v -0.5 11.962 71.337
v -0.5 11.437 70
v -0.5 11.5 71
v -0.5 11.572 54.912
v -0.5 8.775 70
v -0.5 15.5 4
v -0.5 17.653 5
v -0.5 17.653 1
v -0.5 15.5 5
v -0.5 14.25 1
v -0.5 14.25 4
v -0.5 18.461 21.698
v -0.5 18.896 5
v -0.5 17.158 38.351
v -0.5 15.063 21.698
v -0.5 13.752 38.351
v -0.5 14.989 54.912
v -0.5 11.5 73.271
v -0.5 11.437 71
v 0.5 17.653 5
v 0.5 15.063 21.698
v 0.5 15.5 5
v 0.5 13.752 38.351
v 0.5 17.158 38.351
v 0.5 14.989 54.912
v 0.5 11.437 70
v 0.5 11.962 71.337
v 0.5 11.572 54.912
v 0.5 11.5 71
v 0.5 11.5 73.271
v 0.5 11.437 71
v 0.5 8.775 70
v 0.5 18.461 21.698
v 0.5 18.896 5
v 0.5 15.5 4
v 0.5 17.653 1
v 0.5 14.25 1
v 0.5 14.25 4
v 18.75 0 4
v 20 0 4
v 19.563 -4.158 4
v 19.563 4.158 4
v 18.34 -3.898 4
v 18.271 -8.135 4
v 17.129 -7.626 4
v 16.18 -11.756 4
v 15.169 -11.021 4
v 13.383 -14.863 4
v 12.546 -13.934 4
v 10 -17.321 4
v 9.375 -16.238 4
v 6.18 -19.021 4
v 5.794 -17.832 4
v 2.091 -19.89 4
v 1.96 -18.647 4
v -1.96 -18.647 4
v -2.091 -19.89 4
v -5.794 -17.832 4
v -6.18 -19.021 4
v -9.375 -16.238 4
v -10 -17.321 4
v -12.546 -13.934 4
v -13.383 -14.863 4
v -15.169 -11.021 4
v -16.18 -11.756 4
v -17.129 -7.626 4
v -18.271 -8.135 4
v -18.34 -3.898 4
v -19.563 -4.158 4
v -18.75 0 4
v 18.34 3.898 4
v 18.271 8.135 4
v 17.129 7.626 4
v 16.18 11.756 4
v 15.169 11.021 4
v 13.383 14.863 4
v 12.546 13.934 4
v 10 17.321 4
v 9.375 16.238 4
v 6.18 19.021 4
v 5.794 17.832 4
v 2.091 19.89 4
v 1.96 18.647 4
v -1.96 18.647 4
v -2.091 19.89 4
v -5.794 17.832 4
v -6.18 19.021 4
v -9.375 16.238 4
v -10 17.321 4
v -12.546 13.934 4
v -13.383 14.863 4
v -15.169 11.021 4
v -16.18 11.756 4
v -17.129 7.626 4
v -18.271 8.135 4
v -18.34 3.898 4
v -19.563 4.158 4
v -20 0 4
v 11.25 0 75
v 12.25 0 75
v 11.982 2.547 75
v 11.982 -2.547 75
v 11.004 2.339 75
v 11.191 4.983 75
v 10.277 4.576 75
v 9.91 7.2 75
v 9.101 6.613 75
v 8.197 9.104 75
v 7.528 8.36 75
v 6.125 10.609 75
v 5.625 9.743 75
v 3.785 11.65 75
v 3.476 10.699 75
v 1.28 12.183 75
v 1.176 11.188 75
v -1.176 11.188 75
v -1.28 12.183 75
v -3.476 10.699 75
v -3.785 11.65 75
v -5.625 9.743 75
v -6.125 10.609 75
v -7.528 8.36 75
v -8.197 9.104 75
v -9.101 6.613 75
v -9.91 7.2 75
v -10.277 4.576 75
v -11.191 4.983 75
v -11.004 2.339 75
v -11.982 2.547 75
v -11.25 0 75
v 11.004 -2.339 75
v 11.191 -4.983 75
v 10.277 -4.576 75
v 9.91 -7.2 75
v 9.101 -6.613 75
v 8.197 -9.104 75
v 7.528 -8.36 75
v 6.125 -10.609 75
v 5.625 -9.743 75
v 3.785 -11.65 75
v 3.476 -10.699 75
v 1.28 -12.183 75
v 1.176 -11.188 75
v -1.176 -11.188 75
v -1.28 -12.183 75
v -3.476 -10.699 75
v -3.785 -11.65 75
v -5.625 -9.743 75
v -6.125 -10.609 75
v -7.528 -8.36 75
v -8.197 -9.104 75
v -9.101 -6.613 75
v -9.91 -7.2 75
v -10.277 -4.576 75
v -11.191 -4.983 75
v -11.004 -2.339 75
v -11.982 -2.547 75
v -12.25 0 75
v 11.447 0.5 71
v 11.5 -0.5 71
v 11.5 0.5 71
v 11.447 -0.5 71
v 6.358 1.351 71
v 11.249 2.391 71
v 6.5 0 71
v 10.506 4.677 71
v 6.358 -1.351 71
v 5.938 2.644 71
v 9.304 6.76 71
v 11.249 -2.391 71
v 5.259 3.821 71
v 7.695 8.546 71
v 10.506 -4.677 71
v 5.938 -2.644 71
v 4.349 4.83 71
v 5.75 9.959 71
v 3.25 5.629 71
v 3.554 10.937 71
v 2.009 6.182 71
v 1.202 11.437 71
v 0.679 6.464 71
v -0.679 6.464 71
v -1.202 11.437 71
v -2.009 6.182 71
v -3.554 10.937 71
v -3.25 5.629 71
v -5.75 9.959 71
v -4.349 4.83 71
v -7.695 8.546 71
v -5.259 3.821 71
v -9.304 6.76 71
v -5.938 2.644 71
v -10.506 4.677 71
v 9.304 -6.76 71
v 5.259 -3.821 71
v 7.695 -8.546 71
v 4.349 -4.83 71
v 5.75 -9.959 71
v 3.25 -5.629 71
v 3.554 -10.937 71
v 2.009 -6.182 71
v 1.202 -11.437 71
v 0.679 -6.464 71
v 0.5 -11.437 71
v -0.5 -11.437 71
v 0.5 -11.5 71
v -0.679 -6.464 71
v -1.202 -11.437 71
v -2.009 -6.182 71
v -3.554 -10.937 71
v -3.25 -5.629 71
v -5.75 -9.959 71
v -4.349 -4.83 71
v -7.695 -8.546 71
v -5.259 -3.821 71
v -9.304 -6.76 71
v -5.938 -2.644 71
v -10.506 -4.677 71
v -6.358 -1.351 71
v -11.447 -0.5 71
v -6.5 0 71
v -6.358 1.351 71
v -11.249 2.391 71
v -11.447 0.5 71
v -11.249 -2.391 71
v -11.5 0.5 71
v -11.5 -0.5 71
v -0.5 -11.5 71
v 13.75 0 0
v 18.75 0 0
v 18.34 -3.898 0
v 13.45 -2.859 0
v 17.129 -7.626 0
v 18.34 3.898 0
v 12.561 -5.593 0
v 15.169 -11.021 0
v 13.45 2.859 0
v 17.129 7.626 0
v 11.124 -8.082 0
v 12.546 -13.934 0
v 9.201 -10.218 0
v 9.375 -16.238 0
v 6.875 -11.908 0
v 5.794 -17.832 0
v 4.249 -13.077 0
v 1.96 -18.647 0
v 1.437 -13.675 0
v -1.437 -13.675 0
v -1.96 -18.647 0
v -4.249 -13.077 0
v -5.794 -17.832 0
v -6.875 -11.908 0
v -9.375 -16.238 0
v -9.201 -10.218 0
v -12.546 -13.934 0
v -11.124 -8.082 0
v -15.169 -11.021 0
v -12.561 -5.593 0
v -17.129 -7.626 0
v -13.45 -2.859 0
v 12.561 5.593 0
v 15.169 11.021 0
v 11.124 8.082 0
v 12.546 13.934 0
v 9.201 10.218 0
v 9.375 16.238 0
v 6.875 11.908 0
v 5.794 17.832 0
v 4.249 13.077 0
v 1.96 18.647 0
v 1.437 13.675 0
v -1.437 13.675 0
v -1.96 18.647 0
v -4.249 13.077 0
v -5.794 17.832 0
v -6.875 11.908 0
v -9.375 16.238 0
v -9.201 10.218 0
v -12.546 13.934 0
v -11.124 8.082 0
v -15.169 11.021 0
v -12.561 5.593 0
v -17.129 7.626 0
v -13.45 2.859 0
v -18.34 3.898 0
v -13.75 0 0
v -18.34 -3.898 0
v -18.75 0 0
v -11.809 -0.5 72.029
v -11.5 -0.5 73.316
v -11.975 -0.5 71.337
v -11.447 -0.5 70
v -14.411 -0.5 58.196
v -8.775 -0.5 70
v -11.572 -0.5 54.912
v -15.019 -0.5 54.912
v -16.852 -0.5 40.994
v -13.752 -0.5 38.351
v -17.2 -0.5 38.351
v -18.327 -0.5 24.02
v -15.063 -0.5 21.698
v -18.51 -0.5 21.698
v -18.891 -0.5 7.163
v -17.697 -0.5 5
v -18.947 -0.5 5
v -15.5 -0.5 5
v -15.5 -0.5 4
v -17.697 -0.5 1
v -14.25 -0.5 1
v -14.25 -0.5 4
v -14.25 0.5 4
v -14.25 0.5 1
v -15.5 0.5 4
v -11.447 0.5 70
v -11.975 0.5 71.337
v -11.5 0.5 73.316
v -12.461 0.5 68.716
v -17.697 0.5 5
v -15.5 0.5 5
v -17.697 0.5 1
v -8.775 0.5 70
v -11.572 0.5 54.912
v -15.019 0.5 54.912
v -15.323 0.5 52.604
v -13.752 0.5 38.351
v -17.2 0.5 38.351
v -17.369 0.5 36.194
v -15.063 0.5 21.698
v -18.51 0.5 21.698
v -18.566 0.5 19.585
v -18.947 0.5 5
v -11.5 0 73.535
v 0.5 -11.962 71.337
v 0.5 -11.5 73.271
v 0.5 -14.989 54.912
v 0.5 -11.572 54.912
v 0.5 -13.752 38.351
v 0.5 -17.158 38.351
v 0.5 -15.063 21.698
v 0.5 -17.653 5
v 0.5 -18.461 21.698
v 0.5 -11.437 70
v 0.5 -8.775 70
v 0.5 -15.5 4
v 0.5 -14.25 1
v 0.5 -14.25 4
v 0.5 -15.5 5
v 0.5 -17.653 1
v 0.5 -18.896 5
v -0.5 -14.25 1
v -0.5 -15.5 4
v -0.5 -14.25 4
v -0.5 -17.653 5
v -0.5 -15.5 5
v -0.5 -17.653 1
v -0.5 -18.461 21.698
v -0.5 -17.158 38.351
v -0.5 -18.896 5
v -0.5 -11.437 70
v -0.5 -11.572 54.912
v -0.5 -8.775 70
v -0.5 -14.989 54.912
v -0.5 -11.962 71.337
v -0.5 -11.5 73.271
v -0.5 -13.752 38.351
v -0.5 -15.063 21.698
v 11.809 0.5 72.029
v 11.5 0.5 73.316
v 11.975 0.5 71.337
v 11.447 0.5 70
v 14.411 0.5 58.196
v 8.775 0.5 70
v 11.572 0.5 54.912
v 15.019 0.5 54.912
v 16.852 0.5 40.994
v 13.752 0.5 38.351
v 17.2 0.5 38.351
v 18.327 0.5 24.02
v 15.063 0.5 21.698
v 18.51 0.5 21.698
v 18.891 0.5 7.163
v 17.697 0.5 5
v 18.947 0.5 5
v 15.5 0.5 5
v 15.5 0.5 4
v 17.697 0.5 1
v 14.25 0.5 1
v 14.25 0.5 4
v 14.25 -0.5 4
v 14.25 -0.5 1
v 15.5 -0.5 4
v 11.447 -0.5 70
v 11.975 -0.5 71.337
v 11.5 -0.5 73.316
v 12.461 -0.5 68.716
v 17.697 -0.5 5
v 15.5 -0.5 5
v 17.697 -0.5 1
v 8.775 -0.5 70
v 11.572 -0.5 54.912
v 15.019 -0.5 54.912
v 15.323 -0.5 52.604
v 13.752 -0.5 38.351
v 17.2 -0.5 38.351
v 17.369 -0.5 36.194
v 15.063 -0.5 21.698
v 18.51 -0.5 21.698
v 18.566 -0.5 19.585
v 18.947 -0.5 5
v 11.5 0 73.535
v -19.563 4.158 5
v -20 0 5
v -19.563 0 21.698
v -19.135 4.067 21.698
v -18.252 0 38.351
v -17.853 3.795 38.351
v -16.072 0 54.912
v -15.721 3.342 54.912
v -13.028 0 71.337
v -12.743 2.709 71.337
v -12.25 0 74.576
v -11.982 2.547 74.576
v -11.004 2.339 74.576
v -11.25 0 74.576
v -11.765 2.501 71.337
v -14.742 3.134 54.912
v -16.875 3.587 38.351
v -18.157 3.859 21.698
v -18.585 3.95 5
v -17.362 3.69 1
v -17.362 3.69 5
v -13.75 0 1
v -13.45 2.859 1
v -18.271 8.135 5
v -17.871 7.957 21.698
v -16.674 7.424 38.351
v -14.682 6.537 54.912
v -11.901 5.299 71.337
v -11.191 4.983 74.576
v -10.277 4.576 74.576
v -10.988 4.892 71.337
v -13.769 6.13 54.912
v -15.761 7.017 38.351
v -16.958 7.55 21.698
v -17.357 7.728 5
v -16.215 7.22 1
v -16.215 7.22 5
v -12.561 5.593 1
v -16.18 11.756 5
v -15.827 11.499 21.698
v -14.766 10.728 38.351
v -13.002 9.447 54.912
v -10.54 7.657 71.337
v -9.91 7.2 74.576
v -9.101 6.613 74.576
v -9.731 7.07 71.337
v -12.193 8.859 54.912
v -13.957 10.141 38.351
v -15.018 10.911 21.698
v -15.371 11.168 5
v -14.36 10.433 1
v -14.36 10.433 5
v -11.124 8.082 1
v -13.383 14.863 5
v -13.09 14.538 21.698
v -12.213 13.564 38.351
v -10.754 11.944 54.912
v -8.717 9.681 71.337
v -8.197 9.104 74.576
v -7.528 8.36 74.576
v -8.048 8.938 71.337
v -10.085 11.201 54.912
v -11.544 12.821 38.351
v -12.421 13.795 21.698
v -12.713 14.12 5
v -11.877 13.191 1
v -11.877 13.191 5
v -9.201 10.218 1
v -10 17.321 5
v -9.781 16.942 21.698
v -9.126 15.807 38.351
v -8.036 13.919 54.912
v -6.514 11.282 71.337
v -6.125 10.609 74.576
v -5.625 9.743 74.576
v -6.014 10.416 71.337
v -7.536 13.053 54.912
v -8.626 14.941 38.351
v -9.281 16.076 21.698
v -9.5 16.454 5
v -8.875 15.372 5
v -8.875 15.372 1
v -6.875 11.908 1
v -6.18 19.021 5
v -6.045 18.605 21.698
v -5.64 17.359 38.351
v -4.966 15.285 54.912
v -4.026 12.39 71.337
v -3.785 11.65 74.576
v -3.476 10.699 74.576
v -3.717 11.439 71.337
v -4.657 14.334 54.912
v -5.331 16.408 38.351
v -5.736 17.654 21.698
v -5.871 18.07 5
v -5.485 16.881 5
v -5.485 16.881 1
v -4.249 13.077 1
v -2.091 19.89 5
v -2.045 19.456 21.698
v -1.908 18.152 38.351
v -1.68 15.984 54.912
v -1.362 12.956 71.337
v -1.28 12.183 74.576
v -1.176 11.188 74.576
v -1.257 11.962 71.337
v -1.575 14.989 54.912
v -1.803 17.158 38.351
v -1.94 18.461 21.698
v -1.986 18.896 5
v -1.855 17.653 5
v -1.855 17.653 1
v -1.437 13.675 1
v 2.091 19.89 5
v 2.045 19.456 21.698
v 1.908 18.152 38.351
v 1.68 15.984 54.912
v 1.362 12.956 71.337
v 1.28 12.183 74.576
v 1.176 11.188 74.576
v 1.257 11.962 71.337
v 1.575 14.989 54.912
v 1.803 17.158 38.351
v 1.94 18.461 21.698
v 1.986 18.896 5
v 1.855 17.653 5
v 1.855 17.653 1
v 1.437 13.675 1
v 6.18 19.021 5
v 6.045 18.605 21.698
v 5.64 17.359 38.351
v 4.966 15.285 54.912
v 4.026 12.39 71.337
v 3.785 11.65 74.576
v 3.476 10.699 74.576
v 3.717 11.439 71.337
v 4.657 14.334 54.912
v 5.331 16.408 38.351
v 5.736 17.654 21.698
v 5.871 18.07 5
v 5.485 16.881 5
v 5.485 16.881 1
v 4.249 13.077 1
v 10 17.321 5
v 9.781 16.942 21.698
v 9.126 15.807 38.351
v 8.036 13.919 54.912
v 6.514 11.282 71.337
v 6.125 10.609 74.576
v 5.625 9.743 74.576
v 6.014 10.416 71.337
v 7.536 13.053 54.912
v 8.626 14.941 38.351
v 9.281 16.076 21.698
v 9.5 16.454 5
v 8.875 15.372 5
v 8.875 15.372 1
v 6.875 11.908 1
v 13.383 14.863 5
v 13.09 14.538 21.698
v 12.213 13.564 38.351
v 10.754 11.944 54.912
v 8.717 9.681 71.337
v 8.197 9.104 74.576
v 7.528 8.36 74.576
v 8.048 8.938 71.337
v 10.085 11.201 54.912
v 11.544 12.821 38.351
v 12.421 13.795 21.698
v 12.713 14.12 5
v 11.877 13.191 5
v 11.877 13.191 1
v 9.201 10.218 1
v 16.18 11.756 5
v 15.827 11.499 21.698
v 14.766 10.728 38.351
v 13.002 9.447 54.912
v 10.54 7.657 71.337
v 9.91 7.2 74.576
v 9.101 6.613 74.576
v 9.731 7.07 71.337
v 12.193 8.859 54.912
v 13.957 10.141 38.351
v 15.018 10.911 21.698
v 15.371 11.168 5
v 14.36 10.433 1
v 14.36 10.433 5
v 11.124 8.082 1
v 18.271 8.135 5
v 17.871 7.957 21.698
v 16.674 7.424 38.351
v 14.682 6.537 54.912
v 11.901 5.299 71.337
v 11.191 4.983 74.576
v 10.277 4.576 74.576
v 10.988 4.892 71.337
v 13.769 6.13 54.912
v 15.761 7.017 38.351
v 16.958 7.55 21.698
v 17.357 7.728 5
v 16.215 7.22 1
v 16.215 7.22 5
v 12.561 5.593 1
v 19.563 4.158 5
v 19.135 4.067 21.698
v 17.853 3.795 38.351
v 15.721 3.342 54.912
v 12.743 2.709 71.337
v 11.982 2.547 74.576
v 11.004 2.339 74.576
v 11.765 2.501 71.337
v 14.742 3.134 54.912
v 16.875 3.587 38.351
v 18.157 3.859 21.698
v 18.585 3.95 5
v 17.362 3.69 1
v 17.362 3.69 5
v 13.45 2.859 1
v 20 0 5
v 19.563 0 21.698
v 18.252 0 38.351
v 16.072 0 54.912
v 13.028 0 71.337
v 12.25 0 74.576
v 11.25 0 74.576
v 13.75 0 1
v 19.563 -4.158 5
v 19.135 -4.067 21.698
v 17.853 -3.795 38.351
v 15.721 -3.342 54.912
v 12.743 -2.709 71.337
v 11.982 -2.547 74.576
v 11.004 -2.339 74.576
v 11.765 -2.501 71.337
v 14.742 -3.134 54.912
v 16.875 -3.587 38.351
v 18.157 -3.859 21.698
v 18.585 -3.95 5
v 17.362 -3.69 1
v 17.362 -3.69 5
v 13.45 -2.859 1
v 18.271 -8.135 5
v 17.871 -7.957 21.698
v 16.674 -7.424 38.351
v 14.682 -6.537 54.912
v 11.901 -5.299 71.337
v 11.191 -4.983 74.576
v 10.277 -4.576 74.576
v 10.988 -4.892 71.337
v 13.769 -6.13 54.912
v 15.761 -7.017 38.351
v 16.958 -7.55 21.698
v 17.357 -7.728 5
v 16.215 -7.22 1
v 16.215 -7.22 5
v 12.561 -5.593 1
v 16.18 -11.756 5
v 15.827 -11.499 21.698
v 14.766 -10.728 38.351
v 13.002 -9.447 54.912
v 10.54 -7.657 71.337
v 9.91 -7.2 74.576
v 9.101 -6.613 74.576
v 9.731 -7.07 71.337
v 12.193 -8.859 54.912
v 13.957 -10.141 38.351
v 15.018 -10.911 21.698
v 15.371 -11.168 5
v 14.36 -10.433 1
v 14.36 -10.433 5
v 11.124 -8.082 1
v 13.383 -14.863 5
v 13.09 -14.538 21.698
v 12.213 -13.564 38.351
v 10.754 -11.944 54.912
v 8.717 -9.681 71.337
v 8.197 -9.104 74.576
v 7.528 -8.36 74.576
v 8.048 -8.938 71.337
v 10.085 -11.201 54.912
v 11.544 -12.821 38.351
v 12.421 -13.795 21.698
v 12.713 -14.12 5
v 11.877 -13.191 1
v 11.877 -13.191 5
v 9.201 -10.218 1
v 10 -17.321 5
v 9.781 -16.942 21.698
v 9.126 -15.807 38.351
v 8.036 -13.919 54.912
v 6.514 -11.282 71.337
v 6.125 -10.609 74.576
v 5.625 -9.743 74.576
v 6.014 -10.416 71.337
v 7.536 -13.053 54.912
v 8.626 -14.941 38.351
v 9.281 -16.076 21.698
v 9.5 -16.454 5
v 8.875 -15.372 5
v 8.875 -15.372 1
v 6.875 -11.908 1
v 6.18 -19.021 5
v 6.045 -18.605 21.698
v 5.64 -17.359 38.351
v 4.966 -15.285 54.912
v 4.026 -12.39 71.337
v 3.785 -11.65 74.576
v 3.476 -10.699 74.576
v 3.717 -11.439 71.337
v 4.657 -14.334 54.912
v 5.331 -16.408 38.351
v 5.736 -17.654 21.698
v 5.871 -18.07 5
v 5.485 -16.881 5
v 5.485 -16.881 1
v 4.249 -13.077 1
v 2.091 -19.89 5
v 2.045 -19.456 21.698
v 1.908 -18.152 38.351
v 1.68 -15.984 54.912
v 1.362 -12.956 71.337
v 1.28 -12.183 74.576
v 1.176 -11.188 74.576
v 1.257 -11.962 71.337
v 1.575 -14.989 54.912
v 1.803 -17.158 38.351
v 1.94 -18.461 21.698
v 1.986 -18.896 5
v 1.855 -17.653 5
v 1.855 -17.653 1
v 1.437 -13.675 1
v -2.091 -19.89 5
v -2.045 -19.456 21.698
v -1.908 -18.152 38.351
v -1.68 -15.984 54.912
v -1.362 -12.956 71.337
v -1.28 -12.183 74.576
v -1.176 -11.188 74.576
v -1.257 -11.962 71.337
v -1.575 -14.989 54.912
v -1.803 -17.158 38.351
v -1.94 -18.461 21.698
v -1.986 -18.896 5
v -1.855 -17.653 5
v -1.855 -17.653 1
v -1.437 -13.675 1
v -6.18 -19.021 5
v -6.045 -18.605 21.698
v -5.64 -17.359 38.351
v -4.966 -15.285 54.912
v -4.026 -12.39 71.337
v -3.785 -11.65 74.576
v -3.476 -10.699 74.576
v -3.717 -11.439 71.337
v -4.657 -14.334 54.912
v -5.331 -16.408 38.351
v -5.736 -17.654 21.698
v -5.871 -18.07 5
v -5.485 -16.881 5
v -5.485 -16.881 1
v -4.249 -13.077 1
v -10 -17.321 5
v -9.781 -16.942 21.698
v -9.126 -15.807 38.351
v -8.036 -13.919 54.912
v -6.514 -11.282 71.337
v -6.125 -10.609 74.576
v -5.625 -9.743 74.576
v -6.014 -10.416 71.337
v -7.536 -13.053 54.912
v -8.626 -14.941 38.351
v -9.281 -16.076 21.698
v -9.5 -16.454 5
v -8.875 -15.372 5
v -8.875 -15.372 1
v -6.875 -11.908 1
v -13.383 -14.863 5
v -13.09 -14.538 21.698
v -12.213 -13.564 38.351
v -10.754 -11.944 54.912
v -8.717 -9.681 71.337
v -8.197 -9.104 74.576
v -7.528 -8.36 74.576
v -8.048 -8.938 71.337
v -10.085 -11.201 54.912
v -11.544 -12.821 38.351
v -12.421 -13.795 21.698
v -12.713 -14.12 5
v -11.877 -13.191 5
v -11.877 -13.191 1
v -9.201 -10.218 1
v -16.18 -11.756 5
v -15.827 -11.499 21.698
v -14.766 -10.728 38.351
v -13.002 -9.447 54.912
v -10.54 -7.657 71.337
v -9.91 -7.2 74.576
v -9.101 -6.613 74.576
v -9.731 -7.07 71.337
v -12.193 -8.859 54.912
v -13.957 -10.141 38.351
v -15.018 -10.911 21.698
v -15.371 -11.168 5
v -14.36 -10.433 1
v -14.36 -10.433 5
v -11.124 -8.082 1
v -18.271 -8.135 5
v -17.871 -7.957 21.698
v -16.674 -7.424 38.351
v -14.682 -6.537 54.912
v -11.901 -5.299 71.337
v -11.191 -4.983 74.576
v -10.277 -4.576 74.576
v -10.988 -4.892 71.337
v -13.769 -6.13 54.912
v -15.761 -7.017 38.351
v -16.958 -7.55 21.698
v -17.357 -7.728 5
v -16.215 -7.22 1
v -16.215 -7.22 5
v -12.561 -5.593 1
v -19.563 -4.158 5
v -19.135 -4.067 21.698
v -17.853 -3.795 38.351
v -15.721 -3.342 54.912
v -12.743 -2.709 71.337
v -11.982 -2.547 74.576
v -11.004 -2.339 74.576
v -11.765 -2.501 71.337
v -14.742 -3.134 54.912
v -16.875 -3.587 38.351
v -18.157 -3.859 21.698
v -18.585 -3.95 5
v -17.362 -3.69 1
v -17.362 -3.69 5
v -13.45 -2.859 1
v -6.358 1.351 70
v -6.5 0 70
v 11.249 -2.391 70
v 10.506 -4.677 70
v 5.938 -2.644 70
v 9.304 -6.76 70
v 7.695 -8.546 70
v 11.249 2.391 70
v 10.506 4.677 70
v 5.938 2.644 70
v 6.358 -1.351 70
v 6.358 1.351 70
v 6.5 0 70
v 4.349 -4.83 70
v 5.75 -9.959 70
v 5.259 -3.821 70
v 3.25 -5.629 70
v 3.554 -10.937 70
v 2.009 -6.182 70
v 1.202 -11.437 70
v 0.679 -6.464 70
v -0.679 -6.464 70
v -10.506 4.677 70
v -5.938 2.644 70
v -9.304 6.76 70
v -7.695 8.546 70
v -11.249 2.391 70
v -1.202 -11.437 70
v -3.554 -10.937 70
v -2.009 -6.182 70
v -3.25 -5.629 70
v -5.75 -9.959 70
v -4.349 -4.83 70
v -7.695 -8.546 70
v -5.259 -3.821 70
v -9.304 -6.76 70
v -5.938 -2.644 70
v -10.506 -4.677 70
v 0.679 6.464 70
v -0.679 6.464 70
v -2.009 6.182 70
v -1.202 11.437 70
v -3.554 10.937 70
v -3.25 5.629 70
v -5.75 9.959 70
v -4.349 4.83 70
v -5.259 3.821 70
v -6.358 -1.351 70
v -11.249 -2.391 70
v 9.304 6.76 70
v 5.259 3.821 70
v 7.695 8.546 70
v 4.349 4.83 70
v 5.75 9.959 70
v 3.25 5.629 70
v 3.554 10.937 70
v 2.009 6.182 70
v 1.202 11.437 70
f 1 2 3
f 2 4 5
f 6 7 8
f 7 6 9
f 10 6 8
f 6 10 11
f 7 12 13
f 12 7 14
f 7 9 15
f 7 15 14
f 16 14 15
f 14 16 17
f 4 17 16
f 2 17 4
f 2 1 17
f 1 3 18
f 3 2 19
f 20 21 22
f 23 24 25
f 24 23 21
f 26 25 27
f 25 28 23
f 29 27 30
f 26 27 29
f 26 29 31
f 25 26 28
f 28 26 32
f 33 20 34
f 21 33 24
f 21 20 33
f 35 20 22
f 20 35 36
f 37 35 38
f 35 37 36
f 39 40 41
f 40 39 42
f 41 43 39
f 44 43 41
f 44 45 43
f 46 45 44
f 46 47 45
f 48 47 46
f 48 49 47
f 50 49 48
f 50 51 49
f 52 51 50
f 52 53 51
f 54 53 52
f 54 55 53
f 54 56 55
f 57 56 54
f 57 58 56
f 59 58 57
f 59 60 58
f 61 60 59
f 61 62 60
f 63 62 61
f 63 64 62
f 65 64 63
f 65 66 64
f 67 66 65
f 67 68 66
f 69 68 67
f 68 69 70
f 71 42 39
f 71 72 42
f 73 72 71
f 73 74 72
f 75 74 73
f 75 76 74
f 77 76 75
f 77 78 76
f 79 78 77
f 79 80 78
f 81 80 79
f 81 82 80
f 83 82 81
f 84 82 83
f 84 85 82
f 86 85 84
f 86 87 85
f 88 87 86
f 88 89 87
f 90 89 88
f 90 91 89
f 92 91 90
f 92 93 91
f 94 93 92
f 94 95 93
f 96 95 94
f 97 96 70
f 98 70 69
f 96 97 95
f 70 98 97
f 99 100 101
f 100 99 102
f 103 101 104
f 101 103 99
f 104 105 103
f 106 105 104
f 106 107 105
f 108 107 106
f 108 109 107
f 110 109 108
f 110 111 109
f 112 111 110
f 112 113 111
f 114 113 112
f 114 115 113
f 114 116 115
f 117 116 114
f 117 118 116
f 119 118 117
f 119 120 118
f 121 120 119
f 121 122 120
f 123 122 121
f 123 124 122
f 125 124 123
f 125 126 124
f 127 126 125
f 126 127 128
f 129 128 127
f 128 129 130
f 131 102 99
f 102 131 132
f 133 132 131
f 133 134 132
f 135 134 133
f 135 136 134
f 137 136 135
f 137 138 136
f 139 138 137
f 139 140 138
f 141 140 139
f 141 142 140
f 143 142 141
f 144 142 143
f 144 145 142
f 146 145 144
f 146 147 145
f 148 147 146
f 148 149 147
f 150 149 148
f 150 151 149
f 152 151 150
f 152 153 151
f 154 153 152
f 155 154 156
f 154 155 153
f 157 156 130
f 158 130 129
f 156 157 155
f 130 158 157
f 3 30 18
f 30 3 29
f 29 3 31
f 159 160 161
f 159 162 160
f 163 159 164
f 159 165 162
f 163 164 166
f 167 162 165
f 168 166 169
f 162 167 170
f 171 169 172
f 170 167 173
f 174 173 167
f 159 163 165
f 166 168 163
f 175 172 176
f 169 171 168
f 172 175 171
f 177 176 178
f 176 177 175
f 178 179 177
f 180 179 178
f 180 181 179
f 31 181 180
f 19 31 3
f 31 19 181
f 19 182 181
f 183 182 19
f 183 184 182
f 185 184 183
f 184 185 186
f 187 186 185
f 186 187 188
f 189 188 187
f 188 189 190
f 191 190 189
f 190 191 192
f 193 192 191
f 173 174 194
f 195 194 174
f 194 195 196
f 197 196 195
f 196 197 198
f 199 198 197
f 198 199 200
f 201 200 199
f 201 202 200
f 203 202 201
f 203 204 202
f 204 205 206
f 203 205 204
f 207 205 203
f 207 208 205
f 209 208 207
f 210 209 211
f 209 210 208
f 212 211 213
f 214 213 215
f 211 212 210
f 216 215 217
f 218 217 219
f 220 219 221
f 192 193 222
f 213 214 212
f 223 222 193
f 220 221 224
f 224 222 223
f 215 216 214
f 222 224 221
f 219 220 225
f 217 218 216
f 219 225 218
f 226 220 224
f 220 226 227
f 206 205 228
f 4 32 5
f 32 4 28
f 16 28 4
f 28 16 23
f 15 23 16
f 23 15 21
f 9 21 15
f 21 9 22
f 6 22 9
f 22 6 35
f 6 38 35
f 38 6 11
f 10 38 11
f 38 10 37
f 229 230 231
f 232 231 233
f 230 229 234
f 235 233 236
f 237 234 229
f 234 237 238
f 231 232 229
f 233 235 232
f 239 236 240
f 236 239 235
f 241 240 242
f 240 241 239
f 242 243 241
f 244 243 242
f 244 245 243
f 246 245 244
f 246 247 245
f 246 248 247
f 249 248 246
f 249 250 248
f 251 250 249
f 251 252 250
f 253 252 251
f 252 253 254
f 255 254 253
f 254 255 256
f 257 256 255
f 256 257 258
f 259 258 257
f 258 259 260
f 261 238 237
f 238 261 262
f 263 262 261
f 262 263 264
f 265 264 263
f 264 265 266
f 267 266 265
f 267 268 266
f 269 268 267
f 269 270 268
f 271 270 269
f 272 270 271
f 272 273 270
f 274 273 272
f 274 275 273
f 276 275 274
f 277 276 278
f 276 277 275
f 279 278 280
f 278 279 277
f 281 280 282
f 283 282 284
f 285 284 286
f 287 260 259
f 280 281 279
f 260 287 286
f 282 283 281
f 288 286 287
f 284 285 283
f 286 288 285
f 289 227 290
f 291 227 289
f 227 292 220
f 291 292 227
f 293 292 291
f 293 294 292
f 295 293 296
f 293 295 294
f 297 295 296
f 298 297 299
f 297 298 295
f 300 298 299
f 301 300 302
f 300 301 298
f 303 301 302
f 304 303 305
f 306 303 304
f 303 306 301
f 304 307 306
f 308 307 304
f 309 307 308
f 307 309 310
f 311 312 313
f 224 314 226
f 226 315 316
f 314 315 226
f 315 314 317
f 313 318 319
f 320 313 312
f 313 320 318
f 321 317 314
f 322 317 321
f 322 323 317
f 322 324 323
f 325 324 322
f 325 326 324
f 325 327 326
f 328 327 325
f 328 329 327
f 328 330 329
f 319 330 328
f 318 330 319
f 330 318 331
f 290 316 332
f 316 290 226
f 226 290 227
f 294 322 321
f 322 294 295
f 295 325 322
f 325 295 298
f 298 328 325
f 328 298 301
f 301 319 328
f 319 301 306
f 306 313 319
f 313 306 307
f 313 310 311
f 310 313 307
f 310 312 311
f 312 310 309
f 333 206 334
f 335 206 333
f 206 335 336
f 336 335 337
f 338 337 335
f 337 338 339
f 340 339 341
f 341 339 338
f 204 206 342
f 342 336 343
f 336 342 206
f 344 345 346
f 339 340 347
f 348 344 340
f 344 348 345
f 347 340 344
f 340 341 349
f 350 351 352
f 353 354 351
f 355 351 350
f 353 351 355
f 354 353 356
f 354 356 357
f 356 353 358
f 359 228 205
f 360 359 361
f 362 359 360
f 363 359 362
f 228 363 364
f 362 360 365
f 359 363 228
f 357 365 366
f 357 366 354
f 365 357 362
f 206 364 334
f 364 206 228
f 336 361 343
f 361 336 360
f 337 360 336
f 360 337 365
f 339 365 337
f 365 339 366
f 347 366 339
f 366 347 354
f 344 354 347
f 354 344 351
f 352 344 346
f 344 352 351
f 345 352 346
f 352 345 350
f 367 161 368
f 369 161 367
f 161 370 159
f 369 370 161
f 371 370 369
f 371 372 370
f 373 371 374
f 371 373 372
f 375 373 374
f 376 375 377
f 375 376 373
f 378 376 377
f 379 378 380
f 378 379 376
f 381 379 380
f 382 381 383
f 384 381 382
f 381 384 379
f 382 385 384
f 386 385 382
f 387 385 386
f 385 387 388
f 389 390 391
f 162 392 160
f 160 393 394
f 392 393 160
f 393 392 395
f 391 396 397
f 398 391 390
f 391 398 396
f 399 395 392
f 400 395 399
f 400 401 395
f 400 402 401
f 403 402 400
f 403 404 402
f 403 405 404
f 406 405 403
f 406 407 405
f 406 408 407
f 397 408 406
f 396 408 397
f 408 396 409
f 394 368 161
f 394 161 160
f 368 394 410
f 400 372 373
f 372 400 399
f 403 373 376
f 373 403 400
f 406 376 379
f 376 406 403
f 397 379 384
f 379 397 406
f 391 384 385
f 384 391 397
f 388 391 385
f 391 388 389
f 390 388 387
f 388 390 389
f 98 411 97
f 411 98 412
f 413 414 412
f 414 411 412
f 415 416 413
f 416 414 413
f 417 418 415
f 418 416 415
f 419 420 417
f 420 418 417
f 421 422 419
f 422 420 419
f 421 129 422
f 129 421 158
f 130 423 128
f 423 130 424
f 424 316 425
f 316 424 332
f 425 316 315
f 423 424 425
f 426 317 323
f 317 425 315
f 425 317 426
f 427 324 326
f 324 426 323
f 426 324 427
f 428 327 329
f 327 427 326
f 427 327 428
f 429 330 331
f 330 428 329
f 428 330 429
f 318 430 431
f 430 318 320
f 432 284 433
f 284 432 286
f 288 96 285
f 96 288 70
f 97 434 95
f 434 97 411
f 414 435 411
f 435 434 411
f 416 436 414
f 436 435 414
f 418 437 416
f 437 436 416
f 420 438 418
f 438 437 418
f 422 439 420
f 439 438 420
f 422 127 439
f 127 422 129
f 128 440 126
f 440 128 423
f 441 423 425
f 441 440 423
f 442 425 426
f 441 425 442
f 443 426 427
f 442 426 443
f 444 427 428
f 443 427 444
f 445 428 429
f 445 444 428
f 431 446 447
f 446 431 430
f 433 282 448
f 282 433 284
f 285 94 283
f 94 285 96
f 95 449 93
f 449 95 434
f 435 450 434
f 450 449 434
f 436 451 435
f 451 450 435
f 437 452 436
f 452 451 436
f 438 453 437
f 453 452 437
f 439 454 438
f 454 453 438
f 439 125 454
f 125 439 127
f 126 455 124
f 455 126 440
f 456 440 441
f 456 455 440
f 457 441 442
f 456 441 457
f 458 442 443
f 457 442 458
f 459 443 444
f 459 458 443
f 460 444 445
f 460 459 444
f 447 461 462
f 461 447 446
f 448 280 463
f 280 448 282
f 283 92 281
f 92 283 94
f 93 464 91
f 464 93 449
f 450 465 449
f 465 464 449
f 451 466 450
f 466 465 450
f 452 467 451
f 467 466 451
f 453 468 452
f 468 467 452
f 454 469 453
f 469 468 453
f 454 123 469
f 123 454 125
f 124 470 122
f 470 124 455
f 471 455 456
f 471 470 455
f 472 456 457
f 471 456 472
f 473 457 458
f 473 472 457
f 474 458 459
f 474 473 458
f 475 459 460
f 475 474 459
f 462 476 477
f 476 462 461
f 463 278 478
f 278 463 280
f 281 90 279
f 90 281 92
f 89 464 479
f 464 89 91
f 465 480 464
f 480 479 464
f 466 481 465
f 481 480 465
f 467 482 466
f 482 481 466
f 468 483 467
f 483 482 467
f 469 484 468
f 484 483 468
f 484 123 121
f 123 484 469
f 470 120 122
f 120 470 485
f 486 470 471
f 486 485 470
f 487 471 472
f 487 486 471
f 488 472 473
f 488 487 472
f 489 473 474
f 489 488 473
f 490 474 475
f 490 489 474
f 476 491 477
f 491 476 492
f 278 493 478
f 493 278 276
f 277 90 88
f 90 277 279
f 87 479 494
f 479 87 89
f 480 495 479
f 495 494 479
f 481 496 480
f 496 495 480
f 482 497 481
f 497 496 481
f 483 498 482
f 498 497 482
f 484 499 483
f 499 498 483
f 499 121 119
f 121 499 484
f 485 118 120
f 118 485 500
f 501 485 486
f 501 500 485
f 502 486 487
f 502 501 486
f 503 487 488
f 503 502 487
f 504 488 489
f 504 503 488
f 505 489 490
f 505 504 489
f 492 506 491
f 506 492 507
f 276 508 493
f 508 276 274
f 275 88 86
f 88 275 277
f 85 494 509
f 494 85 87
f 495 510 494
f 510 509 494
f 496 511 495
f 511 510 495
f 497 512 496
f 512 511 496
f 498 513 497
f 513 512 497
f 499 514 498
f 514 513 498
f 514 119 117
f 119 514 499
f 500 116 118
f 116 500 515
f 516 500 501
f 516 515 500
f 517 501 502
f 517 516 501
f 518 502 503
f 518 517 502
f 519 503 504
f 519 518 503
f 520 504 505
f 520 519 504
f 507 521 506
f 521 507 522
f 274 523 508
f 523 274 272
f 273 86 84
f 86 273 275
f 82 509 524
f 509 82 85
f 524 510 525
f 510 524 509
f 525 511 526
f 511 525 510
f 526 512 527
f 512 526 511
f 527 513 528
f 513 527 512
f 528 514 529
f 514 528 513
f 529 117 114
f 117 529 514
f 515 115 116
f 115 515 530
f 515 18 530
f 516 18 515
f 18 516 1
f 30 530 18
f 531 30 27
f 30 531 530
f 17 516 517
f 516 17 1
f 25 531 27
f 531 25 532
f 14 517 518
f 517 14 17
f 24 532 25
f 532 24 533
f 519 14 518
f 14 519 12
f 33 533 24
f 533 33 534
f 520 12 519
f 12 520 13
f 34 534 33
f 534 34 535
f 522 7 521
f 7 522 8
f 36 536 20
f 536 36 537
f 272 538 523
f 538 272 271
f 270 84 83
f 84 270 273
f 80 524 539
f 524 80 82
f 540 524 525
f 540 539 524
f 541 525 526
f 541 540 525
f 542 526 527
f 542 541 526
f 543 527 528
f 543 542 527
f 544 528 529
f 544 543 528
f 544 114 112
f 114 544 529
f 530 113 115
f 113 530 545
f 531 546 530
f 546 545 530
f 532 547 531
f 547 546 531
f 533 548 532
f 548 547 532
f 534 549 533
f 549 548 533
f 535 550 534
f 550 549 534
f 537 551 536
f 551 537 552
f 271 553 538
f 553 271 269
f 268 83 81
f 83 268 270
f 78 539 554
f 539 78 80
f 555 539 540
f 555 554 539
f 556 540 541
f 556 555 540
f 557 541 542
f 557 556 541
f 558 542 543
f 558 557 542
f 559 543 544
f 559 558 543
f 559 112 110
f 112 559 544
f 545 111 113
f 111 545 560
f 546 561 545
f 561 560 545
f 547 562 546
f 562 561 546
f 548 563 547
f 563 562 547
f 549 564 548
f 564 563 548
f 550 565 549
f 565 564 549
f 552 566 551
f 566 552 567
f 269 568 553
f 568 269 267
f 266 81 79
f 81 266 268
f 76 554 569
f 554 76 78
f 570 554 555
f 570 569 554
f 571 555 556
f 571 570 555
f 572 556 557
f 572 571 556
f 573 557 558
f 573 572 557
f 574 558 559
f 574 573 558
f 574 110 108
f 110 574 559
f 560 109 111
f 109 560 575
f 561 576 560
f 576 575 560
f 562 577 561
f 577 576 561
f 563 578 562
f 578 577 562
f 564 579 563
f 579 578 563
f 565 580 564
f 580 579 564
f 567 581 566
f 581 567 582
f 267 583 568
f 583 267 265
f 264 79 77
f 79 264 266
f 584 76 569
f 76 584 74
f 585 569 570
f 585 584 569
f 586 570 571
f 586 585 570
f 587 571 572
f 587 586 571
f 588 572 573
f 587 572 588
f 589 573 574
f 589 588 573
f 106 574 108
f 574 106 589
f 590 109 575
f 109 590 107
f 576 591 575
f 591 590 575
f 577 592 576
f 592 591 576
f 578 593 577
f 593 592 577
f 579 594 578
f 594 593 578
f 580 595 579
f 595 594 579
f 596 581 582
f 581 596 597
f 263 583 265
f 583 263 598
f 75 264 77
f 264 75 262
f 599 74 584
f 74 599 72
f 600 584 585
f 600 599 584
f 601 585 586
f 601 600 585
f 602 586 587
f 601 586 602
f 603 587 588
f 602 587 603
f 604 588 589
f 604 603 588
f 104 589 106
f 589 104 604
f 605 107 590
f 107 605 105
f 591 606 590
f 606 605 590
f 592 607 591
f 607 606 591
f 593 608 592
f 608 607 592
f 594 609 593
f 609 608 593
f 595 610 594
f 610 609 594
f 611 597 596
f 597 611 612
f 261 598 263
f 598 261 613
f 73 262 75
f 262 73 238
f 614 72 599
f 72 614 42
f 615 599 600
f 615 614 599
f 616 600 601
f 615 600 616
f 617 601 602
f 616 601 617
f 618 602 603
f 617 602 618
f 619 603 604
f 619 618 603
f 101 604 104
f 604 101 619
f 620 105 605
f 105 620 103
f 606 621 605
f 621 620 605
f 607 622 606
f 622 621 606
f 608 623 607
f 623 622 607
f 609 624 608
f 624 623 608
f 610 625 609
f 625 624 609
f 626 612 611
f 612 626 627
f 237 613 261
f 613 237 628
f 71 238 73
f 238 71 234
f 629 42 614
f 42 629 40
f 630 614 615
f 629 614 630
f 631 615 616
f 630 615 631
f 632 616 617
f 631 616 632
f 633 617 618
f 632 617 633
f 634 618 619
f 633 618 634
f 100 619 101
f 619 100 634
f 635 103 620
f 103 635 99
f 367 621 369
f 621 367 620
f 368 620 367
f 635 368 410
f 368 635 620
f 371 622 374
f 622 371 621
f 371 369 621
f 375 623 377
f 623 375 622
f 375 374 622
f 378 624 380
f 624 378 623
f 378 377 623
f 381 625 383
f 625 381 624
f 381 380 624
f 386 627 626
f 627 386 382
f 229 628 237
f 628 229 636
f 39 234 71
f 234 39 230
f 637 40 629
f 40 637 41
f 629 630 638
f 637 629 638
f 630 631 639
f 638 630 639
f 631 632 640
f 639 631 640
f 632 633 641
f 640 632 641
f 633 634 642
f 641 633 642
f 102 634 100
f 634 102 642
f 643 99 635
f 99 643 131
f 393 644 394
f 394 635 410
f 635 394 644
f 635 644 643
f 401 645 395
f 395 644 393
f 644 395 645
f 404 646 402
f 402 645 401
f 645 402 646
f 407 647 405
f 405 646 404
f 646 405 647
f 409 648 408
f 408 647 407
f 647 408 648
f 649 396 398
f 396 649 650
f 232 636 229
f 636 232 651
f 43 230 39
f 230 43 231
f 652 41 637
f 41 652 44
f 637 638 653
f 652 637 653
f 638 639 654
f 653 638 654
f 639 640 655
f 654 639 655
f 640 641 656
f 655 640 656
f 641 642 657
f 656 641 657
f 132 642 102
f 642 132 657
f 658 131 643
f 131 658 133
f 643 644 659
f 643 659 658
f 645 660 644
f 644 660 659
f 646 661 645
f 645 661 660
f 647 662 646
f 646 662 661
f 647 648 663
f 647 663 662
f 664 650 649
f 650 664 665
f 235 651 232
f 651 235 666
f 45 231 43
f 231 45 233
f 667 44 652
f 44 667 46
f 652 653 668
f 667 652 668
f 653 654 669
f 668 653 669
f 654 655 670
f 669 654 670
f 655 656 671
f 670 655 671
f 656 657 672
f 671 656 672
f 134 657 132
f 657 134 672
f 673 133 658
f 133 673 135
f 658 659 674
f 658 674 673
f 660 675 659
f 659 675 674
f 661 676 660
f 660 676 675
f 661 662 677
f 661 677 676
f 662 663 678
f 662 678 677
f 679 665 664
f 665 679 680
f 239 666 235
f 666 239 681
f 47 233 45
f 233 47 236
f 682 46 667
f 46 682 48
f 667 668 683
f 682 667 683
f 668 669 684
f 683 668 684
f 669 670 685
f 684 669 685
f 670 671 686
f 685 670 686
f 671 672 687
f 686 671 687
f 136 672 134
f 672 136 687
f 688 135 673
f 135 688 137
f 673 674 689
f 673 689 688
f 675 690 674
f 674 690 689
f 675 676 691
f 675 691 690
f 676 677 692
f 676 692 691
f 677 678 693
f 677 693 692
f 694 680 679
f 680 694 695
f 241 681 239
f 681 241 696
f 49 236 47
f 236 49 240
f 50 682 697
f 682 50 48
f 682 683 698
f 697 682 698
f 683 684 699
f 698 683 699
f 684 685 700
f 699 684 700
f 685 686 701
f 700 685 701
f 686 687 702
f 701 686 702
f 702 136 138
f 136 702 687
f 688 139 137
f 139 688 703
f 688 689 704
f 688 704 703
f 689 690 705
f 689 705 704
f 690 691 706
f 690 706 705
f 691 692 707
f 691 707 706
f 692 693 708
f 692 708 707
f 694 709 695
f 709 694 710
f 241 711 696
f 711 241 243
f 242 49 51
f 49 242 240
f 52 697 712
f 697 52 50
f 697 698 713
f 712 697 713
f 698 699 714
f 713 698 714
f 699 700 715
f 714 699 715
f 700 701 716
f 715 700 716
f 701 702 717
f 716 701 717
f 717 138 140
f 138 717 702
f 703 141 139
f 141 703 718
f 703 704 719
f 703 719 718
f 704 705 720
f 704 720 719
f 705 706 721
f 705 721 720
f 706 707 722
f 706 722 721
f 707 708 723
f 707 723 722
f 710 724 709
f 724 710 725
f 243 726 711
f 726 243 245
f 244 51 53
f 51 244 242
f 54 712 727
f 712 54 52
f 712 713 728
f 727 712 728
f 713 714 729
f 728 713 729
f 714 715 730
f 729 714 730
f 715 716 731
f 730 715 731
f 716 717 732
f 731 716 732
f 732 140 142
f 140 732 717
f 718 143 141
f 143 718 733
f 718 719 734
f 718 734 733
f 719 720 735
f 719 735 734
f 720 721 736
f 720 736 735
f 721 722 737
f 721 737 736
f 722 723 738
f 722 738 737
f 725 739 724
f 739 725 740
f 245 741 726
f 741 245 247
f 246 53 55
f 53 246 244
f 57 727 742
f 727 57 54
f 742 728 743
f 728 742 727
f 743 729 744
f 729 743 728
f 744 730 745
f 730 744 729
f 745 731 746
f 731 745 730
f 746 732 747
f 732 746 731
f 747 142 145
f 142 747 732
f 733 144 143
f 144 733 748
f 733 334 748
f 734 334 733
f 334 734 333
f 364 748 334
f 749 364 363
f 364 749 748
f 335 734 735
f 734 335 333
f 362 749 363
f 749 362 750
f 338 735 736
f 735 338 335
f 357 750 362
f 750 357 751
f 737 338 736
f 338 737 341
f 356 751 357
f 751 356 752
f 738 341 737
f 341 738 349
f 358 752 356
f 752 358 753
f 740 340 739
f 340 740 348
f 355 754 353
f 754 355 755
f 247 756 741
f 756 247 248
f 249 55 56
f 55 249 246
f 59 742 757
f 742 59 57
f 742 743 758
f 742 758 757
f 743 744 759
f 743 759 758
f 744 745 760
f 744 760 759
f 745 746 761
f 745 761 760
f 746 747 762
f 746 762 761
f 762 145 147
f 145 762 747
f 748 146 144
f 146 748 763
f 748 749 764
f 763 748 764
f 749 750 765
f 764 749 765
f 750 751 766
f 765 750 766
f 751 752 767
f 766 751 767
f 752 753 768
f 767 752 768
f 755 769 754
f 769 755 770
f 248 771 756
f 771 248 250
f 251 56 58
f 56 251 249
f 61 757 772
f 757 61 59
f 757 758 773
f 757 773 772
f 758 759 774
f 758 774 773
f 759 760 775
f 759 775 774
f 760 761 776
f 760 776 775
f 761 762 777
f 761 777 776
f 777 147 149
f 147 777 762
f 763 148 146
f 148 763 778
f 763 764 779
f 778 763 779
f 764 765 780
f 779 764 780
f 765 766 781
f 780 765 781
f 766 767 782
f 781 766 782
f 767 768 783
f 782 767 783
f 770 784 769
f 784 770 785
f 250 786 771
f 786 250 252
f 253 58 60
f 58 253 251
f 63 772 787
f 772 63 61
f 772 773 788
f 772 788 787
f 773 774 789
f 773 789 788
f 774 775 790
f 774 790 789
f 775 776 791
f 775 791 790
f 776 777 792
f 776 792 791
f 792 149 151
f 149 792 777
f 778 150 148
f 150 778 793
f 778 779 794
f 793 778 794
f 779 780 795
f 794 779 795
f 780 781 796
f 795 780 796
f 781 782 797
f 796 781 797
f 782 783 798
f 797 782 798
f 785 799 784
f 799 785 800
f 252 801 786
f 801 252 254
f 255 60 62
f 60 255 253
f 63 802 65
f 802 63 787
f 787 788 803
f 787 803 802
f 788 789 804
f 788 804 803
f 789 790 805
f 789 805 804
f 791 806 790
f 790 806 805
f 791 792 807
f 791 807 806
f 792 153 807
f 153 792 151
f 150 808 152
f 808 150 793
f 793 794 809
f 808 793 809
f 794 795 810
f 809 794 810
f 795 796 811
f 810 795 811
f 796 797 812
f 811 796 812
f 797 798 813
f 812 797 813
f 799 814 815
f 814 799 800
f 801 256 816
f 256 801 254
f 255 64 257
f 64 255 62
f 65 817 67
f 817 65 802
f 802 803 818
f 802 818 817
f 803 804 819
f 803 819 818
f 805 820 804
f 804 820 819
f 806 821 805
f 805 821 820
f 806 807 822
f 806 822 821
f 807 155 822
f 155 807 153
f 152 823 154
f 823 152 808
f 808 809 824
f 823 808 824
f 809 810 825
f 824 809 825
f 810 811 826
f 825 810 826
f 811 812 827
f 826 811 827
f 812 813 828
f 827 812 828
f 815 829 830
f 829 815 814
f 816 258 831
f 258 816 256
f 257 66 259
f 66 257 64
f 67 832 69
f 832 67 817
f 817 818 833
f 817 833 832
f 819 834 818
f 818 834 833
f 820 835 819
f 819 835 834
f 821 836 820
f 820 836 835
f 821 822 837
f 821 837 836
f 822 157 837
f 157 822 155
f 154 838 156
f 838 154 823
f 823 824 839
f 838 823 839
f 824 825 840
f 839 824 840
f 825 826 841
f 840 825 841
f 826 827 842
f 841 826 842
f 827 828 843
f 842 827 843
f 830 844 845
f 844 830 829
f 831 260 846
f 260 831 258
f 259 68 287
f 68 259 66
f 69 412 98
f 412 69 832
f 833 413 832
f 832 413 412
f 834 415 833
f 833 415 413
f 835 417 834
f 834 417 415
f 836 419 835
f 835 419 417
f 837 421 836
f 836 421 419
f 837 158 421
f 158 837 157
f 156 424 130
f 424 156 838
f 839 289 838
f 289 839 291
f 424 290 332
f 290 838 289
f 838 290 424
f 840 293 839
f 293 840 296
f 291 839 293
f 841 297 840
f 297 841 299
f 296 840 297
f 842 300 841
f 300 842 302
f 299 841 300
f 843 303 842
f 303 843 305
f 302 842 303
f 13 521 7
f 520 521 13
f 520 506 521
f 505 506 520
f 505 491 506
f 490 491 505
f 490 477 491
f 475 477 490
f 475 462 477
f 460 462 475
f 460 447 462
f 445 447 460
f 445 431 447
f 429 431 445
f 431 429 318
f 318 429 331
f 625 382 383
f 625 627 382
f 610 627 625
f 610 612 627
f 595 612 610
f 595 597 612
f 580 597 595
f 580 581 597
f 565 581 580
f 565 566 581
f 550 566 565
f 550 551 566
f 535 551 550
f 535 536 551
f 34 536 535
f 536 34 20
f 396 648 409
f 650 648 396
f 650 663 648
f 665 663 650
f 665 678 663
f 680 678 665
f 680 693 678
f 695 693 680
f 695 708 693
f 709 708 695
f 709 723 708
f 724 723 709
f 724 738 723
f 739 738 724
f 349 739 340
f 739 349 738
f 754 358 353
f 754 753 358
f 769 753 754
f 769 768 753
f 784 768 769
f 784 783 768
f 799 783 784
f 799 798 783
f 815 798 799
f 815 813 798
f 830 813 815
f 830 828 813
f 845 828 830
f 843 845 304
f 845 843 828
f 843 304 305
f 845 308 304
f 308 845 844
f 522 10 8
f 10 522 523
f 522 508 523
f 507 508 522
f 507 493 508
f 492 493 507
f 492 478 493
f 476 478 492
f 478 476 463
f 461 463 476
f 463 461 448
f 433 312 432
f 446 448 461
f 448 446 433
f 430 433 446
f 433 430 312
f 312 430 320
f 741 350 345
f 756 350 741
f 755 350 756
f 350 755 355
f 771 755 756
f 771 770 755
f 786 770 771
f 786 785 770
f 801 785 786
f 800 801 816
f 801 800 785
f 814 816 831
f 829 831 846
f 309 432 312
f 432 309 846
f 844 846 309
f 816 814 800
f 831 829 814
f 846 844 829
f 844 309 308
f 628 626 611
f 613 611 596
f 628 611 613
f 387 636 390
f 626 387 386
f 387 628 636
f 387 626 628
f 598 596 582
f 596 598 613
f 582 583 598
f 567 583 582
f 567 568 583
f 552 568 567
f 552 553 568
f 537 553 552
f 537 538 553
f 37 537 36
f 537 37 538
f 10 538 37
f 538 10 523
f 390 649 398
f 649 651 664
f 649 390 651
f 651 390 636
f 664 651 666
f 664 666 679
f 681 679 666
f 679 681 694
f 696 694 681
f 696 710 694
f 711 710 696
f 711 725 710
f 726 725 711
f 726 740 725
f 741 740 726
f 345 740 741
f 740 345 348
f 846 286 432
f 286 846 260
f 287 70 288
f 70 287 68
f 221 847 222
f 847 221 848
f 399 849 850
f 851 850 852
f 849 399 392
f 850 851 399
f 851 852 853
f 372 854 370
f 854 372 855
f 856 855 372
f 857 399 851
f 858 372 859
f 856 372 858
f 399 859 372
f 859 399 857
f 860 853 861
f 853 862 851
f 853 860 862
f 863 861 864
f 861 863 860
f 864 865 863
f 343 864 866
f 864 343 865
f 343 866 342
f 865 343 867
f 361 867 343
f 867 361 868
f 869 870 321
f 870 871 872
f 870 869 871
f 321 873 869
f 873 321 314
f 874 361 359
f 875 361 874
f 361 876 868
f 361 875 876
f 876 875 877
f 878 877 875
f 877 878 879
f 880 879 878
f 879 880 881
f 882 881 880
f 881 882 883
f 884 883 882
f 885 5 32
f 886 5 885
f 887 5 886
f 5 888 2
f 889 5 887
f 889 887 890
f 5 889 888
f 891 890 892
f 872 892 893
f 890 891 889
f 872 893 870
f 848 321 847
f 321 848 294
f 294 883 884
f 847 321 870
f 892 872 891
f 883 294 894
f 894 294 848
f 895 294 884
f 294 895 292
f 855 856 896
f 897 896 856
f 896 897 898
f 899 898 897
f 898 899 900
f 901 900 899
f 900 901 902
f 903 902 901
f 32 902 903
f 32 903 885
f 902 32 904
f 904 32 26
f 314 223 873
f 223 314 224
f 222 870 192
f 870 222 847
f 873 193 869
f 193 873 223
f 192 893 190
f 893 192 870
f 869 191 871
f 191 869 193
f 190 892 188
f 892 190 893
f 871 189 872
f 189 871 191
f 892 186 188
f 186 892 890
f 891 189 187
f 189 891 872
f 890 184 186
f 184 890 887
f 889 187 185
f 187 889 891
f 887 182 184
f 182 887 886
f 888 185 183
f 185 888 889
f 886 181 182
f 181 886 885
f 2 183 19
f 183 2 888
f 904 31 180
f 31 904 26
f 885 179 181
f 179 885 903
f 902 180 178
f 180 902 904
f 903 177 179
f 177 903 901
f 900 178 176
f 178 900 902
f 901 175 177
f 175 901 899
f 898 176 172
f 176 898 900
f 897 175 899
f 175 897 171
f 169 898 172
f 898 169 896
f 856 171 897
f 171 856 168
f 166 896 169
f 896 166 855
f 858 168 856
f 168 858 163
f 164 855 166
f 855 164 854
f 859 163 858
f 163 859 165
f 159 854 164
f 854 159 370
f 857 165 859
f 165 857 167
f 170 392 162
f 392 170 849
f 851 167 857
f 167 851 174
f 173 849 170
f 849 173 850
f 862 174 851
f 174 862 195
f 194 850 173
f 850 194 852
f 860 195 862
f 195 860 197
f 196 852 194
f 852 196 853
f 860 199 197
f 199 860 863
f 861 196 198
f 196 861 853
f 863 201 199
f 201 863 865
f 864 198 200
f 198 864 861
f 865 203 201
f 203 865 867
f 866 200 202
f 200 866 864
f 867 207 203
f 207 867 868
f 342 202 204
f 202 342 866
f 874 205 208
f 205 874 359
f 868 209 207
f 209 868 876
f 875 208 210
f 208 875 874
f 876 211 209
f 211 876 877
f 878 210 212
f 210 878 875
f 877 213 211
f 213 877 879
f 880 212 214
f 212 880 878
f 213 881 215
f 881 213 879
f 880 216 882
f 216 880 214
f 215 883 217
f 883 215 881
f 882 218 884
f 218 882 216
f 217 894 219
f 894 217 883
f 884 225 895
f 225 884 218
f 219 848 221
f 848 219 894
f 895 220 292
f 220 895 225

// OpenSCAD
//Radius of the bottom of the section
base_radius=20; //[6:55]

//Radius of the top of the section
tip_radius=12;//[0:55]

//It may not work correctly with same diameter ends, ex 15,15, use 15.1,15 or similar

//Length of the rocket section
length = 75;//

//Width of the mounting flanges and braces
mounting_lip_width = 4; //[4:6]

//Thickness of the skin
skin_thickness=1; //[1:4]

//Number of internal bracing ribs
quantity_of_internal_braces = 4;//[2:12]
//
//
//

edge = mounting_lip_width+skin_thickness;
s = base_radius-tip_radius;
sa= tip_radius-base_radius;
//
l = length-mounting_lip_width;
//
a1=s*s;
a1a=sa*sa;

a2=l*l;

a3=2*s;
a3a=2*sa;

a4=a1+a2;
a4a=a1a+a2;

taperrad = a4 / a3;
taperrada= a4a/a3a;

////

for (i=[1:quantity_of_internal_braces]) {rotate([0,0,i*360/quantity_of_internal_braces]){brace();}}

module blockout(){
translate([-5000,-2500]){square([5000,5000]);}}



//blockout();

module bracetopblock(){
    translate([tip_radius-mounting_lip_width,length-mounting_lip_width]){
        square([mounting_lip_width,mounting_lip_width]);}
    }
//bracetopblock();
    
module fe_endsolid(){
    translate([0,length-mounting_lip_width]){
        square([tip_radius+.25,mounting_lip_width]);
        };
    }
//fe_endsolid();

    
module fe_basesolid(){
        translate([0,mounting_lip_width]){
            square([base_radius,skin_thickness]);}
        square([base_radius-skin_thickness-.25,mounting_lip_width]);
        }
    
    
//fe_basesolid();

    
module ccvconesolid(){
    difference(){translate([0,edge]){square([tip_radius,length-edge]);}
        mirror([0,1])
    difference(){
        translate([taperrada+base_radius,-edge]){
            circle(r=taperrada,$fn=120);
            }
        translate([base_radius-edge,-edge]){
            square([taperrada*3,taperrada*3]);
            }
        translate([tip_radius,-taperrada-length]){
            square([taperrada*2,length*5]);
            }
        };
        }
    }
            
       
    
//ccvconesolid();

    
module cvxconesolid(){
            difference(){
                translate([-taperrad+base_radius,edge]){circle(r=taperrad,$fn=120);};
                translate ([-2500,length]){square([5000,5000]);};
                translate ([-2500,-5000+mounting_lip_width]){square([5000,5000]);};
                translate ([-5000,-taperrad*2+mounting_lip_width]){square([5000,5000]);};
            }
        };
    
//cvxconesolid();

            
module skin_profilesolid(){union(){
            fe_basesolid();
            fe_endsolid();
            if (base_radius>tip_radius)cvxconesolid(); else if(base_radius<tip_radius) ccvconesolid();}
        
  }  
//skin_profilesolid();
  
module bsil(){difference(){
        skin_profilesolid();
        skin_profilehollow(-mounting_lip_width);
            }
            
        }

//bsil();
       
module brace(){rotate([90,0,0]){
    translate([-skin_thickness/2,0,-skin_thickness/2]){linear_extrude(height=1){flatbrace();};}
    }
    }

//brace();
    
module flatbrace(){
    difference(){
        rawflatbrace();
        translate([skin_thickness,0]){
            blockout();
            }
        }
    }
//flatbrace();
    
module rawflatbrace(){
difference(){
    difference(){bsil();
          translate([-mounting_lip_width,0]){bsil();}}
         bracetopblock(); }}
//rawflatbrace();
  
module skin_profilehollow(thick){
        translate([thick,0]){
            skin_profilesolid();
            }
        }
//skin_profilehollow(-skin_thickness);

module rawskin_profile(){
    top_flange();
    bottom_flange();
    fixerflange();
    difference(){
        skin_profilesolid();
        skin_profilehollow(-skin_thickness);}
        
            
        }
        


//rawskin_profile();
        
module skin_profile(){
    difference(){
        rawskin_profile();
        blockout();}}
//skin_profile(); 

module flange(){
    square([edge,skin_thickness]);
    }     
//flange();
    
module fixerflange(){
    translate([base_radius-skin_thickness*2-.25,mounting_lip_width]){square([skin_thickness+.25,skin_thickness]);}
    }
         
//fixerflange();
    
module top_flange(){
    translate([tip_radius-skin_thickness*1.5-mounting_lip_width,length-mounting_lip_width-skin_thickness]){flange();}
}
//top_flange(); 

module bottom_flange(){
    translate([base_radius-edge-skin_thickness-.25,0]){flange();}
}
//bottom_flange(); 

module nc_skin3d(){
    rotate_extrude()skin_profile();
    }
//nc_skin3d();
    
module fuse_part(){
    nc_skin3d();
    brace();
    }
fuse_part();

module rocketpart(){
translate([40,0,0]){
    fuse_part();
    translate([0,0,length-mounting_lip_width]){
        fuse_part();
        }
    }
}
   
//rocketpart();
